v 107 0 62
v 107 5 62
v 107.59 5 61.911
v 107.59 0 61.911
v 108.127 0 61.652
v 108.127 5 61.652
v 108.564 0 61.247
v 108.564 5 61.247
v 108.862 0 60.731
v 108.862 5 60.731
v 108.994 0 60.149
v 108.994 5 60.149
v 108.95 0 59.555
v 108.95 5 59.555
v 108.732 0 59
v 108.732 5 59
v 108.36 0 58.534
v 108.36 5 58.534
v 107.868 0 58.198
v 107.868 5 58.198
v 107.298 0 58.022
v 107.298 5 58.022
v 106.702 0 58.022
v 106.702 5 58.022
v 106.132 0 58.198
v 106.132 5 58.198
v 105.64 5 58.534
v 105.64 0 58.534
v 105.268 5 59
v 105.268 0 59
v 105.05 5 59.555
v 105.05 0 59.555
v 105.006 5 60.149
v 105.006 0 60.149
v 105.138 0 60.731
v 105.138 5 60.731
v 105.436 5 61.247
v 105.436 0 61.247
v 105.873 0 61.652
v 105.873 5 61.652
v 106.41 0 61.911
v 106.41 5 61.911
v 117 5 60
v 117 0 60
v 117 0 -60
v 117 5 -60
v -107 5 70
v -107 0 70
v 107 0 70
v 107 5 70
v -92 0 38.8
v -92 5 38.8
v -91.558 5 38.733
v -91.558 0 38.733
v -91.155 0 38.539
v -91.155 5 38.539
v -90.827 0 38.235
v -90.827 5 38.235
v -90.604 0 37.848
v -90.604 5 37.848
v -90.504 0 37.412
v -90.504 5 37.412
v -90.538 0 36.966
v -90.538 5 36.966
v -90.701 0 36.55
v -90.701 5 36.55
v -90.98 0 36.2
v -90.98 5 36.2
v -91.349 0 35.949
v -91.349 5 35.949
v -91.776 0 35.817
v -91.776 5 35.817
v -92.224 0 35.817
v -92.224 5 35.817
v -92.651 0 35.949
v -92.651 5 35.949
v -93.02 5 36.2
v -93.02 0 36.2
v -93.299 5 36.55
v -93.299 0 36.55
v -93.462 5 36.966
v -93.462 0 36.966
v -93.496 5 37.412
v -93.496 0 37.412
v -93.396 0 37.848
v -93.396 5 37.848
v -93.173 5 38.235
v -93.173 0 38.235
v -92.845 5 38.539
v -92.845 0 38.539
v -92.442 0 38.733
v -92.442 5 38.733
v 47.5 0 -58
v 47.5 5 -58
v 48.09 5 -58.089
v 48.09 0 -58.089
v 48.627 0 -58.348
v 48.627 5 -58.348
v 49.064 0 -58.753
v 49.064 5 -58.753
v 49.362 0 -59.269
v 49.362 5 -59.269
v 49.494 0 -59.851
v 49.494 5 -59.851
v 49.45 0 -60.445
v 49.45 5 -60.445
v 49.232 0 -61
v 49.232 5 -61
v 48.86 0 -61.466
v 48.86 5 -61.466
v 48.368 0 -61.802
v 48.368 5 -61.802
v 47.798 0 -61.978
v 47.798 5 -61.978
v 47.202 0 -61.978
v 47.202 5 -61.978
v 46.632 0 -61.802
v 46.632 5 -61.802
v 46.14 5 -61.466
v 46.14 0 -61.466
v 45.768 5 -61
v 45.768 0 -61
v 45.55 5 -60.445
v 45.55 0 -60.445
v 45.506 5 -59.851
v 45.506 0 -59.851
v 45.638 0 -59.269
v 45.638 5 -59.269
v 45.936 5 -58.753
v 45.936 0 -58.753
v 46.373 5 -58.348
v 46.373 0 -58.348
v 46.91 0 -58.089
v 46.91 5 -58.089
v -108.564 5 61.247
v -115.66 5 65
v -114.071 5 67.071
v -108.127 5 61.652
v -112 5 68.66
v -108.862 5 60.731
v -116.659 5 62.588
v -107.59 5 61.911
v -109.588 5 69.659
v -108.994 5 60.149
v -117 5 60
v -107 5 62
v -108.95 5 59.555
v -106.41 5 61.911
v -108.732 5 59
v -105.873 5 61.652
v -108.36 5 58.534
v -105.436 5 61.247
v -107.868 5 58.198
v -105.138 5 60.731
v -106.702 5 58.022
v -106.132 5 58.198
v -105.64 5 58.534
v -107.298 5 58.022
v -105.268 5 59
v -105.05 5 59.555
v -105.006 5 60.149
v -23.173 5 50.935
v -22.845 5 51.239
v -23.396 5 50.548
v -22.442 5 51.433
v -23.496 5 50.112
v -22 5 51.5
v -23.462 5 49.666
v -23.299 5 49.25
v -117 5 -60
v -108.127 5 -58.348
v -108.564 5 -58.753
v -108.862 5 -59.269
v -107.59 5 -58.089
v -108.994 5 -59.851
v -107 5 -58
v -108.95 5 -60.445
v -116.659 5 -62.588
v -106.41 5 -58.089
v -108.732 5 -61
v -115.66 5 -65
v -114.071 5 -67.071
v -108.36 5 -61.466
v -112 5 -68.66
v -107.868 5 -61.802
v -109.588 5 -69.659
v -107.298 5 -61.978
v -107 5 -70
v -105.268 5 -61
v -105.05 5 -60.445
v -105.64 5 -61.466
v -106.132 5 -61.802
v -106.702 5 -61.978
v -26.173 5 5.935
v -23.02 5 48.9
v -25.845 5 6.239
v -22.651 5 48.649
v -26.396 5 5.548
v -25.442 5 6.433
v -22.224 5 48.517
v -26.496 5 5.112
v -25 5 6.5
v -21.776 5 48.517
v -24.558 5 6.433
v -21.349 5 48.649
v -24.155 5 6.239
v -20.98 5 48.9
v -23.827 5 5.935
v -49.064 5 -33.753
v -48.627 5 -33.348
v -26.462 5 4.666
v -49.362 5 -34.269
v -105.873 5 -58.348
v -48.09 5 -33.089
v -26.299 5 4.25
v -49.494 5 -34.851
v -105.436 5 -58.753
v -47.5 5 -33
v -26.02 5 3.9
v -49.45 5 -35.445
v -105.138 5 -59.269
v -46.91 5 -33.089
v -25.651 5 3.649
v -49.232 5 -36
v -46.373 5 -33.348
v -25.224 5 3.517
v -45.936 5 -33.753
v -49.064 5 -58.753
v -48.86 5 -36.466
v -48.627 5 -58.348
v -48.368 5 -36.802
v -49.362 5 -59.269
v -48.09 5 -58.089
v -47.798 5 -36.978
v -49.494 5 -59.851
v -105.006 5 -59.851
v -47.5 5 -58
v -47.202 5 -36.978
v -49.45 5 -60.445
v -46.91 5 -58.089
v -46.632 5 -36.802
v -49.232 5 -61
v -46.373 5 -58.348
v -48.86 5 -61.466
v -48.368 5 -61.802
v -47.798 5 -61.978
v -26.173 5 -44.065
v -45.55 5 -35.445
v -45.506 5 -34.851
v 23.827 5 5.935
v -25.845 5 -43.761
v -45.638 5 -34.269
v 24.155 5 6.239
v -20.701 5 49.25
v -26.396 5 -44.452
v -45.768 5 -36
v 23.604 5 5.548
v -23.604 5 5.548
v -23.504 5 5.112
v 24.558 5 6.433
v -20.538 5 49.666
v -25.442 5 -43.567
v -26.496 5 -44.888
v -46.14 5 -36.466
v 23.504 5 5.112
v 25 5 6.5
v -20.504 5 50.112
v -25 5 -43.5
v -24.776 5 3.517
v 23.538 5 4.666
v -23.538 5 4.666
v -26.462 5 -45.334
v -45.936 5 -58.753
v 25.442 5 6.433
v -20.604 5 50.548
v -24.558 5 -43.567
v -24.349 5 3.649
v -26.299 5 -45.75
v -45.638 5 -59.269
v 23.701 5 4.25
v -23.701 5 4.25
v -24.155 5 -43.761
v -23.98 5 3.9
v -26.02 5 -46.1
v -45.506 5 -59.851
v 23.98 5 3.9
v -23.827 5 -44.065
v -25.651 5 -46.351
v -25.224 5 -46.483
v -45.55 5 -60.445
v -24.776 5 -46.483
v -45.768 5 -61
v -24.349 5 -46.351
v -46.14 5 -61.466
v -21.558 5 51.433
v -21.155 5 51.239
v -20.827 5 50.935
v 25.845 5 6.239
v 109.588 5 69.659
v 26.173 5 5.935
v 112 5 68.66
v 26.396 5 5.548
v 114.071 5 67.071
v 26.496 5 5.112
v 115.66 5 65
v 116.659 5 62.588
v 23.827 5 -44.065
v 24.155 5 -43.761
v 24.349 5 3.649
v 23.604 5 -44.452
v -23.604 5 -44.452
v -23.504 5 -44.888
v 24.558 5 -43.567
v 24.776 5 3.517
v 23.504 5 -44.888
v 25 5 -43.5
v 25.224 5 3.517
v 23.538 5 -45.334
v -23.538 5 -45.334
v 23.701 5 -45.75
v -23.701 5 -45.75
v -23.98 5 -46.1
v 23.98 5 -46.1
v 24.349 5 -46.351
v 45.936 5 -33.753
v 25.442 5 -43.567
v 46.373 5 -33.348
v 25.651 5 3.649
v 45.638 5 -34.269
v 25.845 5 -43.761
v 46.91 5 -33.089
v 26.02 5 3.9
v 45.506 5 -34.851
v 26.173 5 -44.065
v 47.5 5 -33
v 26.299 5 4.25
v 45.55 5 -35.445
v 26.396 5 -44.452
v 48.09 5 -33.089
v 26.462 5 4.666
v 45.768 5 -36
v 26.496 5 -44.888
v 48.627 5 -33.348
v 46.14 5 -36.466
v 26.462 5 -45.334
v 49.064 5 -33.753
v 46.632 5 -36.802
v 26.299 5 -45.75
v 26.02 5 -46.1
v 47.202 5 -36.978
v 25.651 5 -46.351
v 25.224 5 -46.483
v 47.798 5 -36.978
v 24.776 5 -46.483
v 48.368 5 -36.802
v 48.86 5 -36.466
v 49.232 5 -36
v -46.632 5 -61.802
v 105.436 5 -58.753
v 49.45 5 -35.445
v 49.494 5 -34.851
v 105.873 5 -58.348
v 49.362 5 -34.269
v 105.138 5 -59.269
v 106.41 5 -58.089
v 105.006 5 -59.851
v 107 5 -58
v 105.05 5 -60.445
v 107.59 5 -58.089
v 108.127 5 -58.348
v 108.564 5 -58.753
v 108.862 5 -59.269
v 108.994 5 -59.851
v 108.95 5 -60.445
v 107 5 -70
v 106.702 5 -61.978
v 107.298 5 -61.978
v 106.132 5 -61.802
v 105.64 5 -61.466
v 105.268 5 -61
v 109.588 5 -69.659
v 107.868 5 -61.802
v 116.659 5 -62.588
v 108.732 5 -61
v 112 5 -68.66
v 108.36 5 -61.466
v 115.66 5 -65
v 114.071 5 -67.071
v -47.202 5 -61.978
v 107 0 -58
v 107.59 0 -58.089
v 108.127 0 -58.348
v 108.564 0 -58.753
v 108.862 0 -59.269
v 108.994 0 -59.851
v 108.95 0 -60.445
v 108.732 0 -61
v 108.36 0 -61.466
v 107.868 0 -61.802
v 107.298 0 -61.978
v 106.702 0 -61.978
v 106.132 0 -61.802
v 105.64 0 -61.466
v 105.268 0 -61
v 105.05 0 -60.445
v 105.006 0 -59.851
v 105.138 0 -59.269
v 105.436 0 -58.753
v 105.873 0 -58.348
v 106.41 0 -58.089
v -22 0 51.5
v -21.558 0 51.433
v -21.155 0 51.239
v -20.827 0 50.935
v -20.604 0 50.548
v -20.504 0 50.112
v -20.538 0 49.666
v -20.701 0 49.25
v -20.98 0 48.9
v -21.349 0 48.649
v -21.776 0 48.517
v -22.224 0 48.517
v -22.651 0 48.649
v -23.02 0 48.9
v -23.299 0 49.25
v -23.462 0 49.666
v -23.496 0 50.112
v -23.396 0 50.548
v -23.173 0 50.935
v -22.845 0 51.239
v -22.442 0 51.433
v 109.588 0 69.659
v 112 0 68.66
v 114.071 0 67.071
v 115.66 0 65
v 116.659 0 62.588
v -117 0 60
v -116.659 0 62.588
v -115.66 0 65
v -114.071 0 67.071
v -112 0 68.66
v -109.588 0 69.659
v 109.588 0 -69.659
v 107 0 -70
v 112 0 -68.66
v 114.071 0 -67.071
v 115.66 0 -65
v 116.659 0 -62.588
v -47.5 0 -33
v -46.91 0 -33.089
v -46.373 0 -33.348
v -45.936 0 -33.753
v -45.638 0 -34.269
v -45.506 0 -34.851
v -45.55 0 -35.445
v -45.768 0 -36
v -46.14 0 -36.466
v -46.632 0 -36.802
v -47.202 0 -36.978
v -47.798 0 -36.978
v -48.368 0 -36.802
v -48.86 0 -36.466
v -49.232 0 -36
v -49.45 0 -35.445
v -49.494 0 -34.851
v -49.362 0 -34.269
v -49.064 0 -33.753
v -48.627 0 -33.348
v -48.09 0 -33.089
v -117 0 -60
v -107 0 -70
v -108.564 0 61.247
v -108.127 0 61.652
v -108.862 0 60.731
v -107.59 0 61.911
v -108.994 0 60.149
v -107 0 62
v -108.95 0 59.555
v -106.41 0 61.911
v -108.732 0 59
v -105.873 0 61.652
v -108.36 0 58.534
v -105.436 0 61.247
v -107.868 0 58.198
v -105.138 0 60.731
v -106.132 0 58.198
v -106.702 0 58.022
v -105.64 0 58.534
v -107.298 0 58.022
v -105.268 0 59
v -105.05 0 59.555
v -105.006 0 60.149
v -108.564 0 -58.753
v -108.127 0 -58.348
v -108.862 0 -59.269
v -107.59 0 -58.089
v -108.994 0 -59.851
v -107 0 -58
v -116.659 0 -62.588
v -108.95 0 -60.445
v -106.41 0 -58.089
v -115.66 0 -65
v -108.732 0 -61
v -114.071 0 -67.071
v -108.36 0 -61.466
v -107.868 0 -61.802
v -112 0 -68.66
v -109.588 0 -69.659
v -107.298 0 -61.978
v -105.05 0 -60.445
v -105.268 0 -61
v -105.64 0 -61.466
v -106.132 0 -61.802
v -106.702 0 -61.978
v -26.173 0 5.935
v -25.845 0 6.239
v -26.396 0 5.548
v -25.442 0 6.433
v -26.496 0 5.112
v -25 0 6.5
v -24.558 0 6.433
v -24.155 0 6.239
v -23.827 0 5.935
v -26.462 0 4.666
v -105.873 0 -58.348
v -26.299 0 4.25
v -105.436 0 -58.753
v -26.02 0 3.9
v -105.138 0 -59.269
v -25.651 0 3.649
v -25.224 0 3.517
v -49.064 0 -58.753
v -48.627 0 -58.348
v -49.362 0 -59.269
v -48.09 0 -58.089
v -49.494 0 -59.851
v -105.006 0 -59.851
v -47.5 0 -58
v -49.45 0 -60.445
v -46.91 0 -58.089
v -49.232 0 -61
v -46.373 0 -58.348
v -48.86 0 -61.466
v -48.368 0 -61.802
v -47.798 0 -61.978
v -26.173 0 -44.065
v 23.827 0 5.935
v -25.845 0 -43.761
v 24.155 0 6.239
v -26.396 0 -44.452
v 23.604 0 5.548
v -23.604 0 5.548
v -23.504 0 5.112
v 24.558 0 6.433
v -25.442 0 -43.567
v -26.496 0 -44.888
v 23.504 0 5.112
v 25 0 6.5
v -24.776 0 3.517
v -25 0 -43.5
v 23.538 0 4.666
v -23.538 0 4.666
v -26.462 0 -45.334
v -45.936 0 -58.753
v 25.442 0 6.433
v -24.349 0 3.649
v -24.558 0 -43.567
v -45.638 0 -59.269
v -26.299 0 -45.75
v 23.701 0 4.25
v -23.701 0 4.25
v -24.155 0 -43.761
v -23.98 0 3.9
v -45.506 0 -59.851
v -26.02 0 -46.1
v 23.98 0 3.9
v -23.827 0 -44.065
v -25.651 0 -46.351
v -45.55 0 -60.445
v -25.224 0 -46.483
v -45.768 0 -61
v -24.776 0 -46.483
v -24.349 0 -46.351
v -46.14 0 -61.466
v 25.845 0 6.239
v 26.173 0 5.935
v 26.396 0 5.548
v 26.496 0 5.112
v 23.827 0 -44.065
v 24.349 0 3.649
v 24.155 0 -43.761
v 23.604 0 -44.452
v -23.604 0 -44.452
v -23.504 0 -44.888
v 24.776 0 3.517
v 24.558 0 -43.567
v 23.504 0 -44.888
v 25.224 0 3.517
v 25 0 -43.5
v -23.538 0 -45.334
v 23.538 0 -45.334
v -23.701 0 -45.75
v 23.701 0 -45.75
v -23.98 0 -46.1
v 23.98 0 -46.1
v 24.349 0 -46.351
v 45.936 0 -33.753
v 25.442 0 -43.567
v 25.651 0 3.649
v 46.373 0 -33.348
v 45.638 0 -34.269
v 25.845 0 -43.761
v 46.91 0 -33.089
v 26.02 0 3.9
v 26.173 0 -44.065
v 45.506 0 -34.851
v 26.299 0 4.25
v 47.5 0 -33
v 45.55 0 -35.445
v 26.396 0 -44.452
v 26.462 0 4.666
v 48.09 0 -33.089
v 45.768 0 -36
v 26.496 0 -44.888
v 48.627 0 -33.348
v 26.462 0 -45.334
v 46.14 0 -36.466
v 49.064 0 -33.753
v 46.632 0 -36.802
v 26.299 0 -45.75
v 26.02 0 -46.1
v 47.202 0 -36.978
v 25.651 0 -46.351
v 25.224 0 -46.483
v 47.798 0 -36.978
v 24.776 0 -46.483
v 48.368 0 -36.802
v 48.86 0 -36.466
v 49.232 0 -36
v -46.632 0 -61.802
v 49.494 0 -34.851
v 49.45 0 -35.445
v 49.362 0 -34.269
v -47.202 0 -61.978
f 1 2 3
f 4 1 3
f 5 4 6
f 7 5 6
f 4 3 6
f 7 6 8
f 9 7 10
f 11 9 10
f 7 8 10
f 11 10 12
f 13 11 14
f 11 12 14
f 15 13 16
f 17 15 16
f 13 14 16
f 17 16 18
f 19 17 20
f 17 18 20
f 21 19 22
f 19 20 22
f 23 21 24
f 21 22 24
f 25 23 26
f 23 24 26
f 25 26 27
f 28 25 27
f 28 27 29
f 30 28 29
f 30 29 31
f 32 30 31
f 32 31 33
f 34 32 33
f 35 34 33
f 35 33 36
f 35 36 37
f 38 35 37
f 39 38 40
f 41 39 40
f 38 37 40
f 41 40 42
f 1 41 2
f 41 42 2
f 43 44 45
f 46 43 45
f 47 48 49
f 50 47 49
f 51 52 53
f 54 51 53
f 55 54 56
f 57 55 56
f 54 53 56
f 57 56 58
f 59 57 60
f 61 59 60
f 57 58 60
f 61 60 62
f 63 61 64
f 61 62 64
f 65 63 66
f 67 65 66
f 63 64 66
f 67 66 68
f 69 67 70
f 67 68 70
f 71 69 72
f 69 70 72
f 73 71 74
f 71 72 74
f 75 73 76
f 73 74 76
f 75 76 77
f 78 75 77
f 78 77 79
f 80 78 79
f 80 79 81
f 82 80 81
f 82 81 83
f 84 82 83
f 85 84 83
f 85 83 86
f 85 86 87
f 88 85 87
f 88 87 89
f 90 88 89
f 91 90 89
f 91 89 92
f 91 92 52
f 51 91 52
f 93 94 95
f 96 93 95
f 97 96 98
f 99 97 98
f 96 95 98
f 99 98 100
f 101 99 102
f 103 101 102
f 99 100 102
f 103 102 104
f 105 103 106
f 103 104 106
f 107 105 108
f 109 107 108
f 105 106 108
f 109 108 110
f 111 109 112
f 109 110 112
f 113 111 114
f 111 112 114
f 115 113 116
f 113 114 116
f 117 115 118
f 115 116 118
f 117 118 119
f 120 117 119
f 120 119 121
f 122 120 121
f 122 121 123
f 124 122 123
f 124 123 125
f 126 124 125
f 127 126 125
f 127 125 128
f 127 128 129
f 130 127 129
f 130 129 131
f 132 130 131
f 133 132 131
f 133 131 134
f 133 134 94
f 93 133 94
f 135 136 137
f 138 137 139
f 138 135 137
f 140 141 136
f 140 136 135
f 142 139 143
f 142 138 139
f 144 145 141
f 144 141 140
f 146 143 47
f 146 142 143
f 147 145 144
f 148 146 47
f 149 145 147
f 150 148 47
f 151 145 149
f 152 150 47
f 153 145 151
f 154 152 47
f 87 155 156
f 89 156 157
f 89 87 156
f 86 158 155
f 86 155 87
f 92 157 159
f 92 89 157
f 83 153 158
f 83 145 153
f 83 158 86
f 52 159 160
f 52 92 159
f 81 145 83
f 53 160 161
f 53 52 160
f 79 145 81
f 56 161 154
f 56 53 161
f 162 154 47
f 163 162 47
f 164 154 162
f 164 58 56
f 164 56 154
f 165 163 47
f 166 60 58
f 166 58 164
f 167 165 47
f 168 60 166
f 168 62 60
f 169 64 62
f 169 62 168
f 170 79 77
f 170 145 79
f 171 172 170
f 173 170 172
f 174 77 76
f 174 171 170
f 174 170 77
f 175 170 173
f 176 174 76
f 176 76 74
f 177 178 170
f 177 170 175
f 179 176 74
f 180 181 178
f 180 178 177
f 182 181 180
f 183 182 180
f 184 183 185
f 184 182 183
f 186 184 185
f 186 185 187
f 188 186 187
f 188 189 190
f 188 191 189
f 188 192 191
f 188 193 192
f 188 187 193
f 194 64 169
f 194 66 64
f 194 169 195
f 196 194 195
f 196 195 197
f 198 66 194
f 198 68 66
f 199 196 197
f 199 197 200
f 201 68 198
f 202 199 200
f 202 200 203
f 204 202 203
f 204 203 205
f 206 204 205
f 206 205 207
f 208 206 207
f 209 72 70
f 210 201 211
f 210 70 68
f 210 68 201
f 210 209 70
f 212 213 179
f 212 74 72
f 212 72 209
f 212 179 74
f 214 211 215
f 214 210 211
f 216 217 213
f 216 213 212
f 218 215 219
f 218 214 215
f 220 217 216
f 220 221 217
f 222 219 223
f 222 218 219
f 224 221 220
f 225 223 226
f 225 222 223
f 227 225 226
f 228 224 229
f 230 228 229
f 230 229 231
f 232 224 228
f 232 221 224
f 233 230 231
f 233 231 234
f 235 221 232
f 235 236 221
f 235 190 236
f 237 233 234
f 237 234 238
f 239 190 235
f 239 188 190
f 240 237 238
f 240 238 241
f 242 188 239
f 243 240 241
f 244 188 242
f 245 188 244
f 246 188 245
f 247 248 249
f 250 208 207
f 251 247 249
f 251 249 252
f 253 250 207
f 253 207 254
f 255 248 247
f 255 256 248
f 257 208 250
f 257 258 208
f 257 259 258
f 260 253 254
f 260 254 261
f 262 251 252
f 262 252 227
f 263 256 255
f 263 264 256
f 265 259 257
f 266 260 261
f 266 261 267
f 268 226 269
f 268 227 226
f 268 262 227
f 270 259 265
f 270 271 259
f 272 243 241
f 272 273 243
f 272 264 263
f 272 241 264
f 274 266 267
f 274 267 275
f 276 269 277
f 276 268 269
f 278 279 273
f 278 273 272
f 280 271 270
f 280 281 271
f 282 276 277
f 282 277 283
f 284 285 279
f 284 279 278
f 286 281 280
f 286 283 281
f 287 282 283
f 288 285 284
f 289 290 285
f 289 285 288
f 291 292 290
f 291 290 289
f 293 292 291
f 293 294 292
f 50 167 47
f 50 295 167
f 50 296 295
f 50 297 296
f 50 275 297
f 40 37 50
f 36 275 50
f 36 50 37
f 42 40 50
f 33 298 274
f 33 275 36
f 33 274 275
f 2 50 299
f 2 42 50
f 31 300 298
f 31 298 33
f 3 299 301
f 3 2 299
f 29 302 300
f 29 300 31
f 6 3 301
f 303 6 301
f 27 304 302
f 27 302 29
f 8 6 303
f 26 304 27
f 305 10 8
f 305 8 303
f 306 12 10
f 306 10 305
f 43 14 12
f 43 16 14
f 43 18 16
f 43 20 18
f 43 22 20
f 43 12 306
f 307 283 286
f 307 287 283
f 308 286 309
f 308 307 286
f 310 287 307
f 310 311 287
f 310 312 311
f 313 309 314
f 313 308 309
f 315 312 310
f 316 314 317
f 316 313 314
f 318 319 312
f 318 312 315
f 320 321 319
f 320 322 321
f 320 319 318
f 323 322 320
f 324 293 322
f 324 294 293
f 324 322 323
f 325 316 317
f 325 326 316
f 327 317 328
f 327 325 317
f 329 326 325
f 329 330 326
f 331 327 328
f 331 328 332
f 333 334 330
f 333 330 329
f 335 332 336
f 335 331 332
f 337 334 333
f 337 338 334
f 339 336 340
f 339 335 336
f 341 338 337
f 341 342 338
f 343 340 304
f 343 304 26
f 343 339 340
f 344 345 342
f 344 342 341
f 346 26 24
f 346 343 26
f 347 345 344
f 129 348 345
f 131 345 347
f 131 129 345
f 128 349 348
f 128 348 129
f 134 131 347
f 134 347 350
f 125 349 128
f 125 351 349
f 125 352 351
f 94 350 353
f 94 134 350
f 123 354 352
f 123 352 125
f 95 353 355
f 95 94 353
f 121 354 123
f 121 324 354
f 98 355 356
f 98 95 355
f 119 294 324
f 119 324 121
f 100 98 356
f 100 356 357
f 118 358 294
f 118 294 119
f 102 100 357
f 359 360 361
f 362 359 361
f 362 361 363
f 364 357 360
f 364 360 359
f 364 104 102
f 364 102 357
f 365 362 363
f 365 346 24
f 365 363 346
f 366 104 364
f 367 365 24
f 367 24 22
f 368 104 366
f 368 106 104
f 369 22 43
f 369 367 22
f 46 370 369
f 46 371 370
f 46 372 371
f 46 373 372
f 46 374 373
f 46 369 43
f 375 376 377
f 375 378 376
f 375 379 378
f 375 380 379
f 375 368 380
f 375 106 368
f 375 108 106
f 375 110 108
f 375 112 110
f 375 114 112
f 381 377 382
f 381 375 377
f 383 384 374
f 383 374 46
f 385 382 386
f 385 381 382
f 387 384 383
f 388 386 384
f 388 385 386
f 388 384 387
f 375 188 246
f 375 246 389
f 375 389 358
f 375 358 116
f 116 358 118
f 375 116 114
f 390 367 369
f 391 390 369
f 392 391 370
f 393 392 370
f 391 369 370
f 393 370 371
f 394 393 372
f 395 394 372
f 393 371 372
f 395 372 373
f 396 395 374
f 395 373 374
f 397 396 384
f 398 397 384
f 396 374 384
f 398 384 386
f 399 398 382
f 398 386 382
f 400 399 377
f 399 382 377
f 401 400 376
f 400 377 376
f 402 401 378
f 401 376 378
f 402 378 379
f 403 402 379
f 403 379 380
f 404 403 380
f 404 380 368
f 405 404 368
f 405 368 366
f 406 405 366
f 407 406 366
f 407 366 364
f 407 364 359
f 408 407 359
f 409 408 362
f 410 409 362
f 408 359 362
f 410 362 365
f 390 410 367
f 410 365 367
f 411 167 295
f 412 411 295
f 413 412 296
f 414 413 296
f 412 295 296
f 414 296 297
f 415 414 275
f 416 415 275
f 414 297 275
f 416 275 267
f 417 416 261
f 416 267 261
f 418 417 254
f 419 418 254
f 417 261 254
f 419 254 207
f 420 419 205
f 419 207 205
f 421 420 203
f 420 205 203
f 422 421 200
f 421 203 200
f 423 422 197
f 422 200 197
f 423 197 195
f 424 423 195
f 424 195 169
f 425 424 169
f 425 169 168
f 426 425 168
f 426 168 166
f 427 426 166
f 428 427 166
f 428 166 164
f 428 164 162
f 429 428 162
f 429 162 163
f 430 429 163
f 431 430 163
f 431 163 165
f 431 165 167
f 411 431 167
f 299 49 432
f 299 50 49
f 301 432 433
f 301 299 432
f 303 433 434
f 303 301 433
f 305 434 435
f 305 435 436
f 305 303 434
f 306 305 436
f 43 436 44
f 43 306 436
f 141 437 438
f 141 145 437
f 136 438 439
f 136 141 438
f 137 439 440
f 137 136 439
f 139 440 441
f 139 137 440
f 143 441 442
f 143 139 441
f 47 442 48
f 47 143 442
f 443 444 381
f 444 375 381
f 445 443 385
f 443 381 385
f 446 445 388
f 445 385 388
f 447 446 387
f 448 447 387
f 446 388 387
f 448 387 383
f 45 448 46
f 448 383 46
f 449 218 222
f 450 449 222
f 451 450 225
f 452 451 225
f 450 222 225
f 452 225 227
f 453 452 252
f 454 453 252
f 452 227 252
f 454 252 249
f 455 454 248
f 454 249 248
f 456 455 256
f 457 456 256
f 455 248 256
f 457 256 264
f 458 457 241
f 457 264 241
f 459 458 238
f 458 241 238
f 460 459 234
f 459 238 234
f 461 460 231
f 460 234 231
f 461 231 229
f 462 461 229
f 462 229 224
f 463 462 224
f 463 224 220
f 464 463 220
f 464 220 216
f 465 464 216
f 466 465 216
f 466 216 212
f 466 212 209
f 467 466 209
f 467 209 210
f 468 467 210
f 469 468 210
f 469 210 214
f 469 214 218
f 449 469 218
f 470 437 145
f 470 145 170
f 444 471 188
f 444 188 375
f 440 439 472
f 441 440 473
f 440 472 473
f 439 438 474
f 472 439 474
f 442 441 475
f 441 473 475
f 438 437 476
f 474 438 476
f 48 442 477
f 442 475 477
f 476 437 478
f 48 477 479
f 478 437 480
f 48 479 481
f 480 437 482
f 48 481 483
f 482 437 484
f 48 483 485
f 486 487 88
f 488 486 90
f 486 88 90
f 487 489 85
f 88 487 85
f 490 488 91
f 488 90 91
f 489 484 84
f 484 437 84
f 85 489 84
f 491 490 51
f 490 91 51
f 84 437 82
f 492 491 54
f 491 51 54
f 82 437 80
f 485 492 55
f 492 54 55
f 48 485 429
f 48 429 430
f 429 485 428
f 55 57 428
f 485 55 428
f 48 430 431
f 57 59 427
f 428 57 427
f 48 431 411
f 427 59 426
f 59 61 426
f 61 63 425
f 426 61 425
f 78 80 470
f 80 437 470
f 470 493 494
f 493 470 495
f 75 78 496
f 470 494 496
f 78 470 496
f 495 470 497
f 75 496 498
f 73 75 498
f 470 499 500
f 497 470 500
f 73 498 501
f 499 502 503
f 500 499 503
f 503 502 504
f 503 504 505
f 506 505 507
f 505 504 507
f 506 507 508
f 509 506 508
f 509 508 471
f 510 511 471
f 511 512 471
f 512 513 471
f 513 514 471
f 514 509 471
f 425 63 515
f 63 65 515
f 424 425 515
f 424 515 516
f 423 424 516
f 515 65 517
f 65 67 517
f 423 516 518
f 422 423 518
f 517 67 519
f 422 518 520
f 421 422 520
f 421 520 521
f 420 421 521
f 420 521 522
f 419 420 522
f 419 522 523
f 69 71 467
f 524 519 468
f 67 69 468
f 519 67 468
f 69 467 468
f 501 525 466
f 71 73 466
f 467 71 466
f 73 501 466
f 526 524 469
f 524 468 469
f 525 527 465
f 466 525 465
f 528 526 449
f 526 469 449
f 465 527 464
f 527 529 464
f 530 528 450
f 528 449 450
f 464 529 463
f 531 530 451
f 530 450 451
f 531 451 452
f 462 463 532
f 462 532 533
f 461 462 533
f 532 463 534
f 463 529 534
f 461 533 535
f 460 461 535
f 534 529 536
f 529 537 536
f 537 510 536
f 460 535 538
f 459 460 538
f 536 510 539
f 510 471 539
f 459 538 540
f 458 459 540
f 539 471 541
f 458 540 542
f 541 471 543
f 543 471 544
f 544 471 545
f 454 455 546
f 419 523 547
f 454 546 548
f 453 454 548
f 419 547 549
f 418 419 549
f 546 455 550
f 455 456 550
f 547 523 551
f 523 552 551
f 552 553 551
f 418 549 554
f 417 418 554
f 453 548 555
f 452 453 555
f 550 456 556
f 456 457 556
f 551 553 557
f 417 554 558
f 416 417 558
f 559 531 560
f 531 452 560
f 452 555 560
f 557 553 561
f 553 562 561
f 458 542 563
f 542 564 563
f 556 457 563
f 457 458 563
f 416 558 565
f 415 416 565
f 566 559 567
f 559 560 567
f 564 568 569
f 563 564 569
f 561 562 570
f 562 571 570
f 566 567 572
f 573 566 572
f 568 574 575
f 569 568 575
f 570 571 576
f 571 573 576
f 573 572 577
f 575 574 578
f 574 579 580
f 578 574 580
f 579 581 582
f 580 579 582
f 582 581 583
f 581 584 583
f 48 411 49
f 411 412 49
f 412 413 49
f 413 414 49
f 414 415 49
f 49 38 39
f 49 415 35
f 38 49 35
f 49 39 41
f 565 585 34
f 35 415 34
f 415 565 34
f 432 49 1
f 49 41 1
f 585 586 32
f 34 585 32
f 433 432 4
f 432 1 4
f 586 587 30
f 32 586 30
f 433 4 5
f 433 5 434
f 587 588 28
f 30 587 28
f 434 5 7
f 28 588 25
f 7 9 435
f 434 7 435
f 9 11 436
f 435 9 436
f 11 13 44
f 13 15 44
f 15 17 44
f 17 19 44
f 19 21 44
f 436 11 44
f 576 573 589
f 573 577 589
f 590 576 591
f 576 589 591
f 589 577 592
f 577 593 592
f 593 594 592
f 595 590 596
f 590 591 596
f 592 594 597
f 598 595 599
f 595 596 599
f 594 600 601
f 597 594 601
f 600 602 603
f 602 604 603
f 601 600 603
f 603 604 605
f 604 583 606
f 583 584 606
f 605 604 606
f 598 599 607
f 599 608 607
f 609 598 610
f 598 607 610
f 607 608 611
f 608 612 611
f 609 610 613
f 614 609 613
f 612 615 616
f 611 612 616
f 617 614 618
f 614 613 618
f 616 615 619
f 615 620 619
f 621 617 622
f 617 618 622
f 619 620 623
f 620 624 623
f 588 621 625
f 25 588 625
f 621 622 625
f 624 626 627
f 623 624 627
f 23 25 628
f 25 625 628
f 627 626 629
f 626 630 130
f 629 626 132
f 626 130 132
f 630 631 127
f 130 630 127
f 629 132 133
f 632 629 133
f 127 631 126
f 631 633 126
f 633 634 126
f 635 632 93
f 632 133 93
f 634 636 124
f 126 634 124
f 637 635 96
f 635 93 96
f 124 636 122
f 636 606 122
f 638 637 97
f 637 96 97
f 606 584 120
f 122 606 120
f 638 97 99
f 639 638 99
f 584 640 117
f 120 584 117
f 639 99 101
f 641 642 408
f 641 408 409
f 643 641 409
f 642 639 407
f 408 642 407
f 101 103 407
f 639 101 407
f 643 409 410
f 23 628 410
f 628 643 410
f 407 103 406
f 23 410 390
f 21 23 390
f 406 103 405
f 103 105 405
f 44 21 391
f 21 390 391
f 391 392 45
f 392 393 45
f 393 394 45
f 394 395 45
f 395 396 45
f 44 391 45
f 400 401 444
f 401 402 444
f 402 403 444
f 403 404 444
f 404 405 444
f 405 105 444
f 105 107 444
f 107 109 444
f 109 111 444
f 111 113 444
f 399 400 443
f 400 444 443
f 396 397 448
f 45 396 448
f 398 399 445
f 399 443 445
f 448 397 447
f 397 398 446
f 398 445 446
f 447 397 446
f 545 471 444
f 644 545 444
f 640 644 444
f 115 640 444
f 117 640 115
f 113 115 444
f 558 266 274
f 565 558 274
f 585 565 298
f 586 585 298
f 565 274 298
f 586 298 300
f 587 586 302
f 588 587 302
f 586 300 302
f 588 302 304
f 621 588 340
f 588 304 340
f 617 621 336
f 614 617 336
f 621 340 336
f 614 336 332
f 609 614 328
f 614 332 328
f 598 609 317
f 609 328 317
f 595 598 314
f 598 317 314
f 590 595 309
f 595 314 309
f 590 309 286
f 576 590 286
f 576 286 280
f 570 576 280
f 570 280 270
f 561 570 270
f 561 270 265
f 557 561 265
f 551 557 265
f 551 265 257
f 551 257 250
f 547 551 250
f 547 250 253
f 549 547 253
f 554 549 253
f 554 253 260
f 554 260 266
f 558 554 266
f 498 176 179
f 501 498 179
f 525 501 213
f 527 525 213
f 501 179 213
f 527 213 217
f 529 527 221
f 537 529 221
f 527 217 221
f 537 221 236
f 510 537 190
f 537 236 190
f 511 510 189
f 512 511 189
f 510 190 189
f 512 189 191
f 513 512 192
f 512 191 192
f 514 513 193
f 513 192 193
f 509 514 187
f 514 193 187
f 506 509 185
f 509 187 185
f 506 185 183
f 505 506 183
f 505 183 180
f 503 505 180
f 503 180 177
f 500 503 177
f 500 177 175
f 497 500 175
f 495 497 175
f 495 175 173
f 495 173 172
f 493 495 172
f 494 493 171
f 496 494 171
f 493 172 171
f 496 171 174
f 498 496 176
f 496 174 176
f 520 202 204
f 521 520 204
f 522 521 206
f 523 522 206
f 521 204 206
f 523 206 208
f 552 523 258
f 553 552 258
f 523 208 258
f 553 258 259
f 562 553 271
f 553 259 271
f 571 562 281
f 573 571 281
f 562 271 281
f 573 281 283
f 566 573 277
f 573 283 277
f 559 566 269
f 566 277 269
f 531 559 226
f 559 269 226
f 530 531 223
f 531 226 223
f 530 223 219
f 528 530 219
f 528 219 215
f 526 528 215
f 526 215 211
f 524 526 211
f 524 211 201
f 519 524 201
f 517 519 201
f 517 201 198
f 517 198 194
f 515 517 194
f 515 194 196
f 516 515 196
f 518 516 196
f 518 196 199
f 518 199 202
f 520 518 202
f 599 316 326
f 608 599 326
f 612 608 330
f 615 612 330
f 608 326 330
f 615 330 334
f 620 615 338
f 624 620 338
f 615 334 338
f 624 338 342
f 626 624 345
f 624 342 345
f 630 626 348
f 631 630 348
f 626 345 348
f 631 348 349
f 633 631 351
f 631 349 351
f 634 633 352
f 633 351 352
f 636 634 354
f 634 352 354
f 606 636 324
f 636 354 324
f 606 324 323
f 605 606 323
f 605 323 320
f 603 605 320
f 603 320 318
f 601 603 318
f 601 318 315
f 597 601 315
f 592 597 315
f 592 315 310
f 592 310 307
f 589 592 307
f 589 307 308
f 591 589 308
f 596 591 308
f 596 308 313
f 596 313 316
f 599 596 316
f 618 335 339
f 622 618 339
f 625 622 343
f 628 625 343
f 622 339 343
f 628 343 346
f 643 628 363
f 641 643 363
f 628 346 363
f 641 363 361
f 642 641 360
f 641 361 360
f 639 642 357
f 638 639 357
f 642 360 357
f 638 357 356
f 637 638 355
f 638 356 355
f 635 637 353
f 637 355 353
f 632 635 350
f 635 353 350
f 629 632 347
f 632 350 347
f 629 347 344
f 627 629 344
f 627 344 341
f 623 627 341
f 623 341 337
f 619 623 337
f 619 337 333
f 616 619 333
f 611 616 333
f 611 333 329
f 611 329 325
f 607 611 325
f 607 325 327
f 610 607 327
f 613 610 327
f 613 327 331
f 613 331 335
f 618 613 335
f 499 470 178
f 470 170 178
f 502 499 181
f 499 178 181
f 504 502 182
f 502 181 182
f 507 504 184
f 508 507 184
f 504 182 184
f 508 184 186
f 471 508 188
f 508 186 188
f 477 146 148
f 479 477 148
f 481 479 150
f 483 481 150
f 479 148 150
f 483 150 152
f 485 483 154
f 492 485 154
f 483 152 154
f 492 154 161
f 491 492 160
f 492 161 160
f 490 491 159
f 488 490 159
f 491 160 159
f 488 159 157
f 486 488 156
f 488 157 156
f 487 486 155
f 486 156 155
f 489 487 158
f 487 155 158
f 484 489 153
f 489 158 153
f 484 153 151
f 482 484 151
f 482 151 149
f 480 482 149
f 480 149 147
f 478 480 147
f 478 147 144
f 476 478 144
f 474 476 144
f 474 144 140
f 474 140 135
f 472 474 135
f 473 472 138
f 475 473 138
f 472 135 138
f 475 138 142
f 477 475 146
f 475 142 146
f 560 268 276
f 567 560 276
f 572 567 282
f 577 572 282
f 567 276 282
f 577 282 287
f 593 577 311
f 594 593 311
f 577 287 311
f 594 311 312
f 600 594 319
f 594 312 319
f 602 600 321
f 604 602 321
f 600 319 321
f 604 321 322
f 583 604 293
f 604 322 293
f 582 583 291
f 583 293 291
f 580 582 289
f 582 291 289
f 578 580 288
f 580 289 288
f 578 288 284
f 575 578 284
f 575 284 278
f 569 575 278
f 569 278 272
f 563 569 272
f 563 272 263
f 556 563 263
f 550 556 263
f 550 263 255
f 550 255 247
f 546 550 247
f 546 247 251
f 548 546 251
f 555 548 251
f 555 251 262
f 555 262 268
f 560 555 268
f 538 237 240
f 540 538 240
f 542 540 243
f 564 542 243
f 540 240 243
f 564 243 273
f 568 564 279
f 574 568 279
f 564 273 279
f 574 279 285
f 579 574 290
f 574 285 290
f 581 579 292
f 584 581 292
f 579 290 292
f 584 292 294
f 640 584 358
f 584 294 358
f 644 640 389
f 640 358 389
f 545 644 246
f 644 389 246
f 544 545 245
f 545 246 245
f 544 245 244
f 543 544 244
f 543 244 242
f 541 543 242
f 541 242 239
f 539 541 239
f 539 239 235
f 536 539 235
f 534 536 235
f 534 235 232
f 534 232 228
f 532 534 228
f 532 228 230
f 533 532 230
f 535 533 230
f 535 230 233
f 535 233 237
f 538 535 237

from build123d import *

# Parameters (mm, degrees)
SKETCH_1_W          = 234
SKETCH_1_H          = 140
EXTRUDE_1_DEPTH     = 5
SKETCH_2_R          = 2
CUT_EXTRUDE_1_DEPTH = 5
FILLET_1_R          = 10
SKETCH_3_R          = 2
CUT_EXTRUDE_2_DEPTH = 20
SKETCH_4_R          = 1.5
CUT_EXTRUDE_3_DEPTH = 10
SKETCH_5_R          = 1.5
CUT_EXTRUDE_4_DEPTH = 10


with BuildPart() as part:
    # 草图1 → 凸台-拉伸1 (new body)
    with BuildSketch(Plane(origin=(0, 0, 0), x_dir=(1, 0, 0), z_dir=(0, 1, 0))):
        Rectangle(SKETCH_1_W, SKETCH_1_H)
    extrude(amount=EXTRUDE_1_DEPTH)

    # 草图2 → 切除-拉伸1 (cut)
    with BuildSketch(Plane(origin=(0, 5, 0), x_dir=(1, 0, 0), z_dir=(0, 1, 0))):
        with Locations(Location((-107, 60, 0), (0, 0, 270))):
            Circle(SKETCH_2_R)
        with Locations(Location((107, 60, 0), (0, 0, 270))):
            Circle(SKETCH_2_R)
        with Locations(Location((107, -60, 0), (0, 0, 270))):
            Circle(SKETCH_2_R)
        with Locations(Location((-107, -60, 0), (0, 0, 270))):
            Circle(SKETCH_2_R)
    extrude(amount=-CUT_EXTRUDE_1_DEPTH, mode=Mode.SUBTRACT)

    # 圆角1
    fillet_1_edges = [part.edges().sort_by_distance(p)[0] for p in [
        (-117, 2.5, -70),
        (117, 2.5, -70),
        (117, 2.5, 70),
        (-117, 2.5, 70),
    ]]
    fillet(fillet_1_edges, radius=FILLET_1_R)

    # 草图3 → 切除-拉伸2 (cut)
    with BuildSketch(Plane(origin=(0, 5, 0), x_dir=(1, 0, 0), z_dir=(0, 1, 0))):
        with Locations(Location((-47.5, 60, 0), (0, 0, 270))):
            Circle(SKETCH_3_R)
        with Locations(Location((47.5, 60, 0), (0, 0, 270))):
            Circle(SKETCH_3_R)
        with Locations(Location((47.5, 35, 0), (0, 0, 270))):
            Circle(SKETCH_3_R)
        with Locations(Location((-47.5, 35, 0), (0, 0, 270))):
            Circle(SKETCH_3_R)
    extrude(amount=-CUT_EXTRUDE_2_DEPTH, mode=Mode.SUBTRACT)

    # 草图4 → 切除-拉伸3 (cut)
    with BuildSketch(Plane(origin=(0, 5, 0), x_dir=(1, 0, 0), z_dir=(0, 1, 0))):
        with Locations(Location((-25, 45, 0), (0, 0, 270))):
            Circle(SKETCH_4_R)
        with Locations(Location((25, 45, 0), (0, 0, 270))):
            Circle(SKETCH_4_R)
        with Locations(Location((25, -5, 0), (0, 0, 270))):
            Circle(SKETCH_4_R)
        with Locations(Location((-25, -5, 0), (0, 0, 270))):
            Circle(SKETCH_4_R)
    extrude(amount=-CUT_EXTRUDE_3_DEPTH, mode=Mode.SUBTRACT)

    # 草图5 → 切除-拉伸4 (cut)
    with BuildSketch(Plane(origin=(0, 5, 0), x_dir=(1, 0, 0), z_dir=(0, 1, 0))):
        with Locations(Location((-92, -37.3, 0), (0, 0, 270))):
            Circle(SKETCH_5_R)
        with Locations(Location((-22, -50, 0), (0, 0, 270))):
            Circle(SKETCH_5_R)
    extrude(amount=-CUT_EXTRUDE_4_DEPTH, mode=Mode.SUBTRACT)


solid = part.part
